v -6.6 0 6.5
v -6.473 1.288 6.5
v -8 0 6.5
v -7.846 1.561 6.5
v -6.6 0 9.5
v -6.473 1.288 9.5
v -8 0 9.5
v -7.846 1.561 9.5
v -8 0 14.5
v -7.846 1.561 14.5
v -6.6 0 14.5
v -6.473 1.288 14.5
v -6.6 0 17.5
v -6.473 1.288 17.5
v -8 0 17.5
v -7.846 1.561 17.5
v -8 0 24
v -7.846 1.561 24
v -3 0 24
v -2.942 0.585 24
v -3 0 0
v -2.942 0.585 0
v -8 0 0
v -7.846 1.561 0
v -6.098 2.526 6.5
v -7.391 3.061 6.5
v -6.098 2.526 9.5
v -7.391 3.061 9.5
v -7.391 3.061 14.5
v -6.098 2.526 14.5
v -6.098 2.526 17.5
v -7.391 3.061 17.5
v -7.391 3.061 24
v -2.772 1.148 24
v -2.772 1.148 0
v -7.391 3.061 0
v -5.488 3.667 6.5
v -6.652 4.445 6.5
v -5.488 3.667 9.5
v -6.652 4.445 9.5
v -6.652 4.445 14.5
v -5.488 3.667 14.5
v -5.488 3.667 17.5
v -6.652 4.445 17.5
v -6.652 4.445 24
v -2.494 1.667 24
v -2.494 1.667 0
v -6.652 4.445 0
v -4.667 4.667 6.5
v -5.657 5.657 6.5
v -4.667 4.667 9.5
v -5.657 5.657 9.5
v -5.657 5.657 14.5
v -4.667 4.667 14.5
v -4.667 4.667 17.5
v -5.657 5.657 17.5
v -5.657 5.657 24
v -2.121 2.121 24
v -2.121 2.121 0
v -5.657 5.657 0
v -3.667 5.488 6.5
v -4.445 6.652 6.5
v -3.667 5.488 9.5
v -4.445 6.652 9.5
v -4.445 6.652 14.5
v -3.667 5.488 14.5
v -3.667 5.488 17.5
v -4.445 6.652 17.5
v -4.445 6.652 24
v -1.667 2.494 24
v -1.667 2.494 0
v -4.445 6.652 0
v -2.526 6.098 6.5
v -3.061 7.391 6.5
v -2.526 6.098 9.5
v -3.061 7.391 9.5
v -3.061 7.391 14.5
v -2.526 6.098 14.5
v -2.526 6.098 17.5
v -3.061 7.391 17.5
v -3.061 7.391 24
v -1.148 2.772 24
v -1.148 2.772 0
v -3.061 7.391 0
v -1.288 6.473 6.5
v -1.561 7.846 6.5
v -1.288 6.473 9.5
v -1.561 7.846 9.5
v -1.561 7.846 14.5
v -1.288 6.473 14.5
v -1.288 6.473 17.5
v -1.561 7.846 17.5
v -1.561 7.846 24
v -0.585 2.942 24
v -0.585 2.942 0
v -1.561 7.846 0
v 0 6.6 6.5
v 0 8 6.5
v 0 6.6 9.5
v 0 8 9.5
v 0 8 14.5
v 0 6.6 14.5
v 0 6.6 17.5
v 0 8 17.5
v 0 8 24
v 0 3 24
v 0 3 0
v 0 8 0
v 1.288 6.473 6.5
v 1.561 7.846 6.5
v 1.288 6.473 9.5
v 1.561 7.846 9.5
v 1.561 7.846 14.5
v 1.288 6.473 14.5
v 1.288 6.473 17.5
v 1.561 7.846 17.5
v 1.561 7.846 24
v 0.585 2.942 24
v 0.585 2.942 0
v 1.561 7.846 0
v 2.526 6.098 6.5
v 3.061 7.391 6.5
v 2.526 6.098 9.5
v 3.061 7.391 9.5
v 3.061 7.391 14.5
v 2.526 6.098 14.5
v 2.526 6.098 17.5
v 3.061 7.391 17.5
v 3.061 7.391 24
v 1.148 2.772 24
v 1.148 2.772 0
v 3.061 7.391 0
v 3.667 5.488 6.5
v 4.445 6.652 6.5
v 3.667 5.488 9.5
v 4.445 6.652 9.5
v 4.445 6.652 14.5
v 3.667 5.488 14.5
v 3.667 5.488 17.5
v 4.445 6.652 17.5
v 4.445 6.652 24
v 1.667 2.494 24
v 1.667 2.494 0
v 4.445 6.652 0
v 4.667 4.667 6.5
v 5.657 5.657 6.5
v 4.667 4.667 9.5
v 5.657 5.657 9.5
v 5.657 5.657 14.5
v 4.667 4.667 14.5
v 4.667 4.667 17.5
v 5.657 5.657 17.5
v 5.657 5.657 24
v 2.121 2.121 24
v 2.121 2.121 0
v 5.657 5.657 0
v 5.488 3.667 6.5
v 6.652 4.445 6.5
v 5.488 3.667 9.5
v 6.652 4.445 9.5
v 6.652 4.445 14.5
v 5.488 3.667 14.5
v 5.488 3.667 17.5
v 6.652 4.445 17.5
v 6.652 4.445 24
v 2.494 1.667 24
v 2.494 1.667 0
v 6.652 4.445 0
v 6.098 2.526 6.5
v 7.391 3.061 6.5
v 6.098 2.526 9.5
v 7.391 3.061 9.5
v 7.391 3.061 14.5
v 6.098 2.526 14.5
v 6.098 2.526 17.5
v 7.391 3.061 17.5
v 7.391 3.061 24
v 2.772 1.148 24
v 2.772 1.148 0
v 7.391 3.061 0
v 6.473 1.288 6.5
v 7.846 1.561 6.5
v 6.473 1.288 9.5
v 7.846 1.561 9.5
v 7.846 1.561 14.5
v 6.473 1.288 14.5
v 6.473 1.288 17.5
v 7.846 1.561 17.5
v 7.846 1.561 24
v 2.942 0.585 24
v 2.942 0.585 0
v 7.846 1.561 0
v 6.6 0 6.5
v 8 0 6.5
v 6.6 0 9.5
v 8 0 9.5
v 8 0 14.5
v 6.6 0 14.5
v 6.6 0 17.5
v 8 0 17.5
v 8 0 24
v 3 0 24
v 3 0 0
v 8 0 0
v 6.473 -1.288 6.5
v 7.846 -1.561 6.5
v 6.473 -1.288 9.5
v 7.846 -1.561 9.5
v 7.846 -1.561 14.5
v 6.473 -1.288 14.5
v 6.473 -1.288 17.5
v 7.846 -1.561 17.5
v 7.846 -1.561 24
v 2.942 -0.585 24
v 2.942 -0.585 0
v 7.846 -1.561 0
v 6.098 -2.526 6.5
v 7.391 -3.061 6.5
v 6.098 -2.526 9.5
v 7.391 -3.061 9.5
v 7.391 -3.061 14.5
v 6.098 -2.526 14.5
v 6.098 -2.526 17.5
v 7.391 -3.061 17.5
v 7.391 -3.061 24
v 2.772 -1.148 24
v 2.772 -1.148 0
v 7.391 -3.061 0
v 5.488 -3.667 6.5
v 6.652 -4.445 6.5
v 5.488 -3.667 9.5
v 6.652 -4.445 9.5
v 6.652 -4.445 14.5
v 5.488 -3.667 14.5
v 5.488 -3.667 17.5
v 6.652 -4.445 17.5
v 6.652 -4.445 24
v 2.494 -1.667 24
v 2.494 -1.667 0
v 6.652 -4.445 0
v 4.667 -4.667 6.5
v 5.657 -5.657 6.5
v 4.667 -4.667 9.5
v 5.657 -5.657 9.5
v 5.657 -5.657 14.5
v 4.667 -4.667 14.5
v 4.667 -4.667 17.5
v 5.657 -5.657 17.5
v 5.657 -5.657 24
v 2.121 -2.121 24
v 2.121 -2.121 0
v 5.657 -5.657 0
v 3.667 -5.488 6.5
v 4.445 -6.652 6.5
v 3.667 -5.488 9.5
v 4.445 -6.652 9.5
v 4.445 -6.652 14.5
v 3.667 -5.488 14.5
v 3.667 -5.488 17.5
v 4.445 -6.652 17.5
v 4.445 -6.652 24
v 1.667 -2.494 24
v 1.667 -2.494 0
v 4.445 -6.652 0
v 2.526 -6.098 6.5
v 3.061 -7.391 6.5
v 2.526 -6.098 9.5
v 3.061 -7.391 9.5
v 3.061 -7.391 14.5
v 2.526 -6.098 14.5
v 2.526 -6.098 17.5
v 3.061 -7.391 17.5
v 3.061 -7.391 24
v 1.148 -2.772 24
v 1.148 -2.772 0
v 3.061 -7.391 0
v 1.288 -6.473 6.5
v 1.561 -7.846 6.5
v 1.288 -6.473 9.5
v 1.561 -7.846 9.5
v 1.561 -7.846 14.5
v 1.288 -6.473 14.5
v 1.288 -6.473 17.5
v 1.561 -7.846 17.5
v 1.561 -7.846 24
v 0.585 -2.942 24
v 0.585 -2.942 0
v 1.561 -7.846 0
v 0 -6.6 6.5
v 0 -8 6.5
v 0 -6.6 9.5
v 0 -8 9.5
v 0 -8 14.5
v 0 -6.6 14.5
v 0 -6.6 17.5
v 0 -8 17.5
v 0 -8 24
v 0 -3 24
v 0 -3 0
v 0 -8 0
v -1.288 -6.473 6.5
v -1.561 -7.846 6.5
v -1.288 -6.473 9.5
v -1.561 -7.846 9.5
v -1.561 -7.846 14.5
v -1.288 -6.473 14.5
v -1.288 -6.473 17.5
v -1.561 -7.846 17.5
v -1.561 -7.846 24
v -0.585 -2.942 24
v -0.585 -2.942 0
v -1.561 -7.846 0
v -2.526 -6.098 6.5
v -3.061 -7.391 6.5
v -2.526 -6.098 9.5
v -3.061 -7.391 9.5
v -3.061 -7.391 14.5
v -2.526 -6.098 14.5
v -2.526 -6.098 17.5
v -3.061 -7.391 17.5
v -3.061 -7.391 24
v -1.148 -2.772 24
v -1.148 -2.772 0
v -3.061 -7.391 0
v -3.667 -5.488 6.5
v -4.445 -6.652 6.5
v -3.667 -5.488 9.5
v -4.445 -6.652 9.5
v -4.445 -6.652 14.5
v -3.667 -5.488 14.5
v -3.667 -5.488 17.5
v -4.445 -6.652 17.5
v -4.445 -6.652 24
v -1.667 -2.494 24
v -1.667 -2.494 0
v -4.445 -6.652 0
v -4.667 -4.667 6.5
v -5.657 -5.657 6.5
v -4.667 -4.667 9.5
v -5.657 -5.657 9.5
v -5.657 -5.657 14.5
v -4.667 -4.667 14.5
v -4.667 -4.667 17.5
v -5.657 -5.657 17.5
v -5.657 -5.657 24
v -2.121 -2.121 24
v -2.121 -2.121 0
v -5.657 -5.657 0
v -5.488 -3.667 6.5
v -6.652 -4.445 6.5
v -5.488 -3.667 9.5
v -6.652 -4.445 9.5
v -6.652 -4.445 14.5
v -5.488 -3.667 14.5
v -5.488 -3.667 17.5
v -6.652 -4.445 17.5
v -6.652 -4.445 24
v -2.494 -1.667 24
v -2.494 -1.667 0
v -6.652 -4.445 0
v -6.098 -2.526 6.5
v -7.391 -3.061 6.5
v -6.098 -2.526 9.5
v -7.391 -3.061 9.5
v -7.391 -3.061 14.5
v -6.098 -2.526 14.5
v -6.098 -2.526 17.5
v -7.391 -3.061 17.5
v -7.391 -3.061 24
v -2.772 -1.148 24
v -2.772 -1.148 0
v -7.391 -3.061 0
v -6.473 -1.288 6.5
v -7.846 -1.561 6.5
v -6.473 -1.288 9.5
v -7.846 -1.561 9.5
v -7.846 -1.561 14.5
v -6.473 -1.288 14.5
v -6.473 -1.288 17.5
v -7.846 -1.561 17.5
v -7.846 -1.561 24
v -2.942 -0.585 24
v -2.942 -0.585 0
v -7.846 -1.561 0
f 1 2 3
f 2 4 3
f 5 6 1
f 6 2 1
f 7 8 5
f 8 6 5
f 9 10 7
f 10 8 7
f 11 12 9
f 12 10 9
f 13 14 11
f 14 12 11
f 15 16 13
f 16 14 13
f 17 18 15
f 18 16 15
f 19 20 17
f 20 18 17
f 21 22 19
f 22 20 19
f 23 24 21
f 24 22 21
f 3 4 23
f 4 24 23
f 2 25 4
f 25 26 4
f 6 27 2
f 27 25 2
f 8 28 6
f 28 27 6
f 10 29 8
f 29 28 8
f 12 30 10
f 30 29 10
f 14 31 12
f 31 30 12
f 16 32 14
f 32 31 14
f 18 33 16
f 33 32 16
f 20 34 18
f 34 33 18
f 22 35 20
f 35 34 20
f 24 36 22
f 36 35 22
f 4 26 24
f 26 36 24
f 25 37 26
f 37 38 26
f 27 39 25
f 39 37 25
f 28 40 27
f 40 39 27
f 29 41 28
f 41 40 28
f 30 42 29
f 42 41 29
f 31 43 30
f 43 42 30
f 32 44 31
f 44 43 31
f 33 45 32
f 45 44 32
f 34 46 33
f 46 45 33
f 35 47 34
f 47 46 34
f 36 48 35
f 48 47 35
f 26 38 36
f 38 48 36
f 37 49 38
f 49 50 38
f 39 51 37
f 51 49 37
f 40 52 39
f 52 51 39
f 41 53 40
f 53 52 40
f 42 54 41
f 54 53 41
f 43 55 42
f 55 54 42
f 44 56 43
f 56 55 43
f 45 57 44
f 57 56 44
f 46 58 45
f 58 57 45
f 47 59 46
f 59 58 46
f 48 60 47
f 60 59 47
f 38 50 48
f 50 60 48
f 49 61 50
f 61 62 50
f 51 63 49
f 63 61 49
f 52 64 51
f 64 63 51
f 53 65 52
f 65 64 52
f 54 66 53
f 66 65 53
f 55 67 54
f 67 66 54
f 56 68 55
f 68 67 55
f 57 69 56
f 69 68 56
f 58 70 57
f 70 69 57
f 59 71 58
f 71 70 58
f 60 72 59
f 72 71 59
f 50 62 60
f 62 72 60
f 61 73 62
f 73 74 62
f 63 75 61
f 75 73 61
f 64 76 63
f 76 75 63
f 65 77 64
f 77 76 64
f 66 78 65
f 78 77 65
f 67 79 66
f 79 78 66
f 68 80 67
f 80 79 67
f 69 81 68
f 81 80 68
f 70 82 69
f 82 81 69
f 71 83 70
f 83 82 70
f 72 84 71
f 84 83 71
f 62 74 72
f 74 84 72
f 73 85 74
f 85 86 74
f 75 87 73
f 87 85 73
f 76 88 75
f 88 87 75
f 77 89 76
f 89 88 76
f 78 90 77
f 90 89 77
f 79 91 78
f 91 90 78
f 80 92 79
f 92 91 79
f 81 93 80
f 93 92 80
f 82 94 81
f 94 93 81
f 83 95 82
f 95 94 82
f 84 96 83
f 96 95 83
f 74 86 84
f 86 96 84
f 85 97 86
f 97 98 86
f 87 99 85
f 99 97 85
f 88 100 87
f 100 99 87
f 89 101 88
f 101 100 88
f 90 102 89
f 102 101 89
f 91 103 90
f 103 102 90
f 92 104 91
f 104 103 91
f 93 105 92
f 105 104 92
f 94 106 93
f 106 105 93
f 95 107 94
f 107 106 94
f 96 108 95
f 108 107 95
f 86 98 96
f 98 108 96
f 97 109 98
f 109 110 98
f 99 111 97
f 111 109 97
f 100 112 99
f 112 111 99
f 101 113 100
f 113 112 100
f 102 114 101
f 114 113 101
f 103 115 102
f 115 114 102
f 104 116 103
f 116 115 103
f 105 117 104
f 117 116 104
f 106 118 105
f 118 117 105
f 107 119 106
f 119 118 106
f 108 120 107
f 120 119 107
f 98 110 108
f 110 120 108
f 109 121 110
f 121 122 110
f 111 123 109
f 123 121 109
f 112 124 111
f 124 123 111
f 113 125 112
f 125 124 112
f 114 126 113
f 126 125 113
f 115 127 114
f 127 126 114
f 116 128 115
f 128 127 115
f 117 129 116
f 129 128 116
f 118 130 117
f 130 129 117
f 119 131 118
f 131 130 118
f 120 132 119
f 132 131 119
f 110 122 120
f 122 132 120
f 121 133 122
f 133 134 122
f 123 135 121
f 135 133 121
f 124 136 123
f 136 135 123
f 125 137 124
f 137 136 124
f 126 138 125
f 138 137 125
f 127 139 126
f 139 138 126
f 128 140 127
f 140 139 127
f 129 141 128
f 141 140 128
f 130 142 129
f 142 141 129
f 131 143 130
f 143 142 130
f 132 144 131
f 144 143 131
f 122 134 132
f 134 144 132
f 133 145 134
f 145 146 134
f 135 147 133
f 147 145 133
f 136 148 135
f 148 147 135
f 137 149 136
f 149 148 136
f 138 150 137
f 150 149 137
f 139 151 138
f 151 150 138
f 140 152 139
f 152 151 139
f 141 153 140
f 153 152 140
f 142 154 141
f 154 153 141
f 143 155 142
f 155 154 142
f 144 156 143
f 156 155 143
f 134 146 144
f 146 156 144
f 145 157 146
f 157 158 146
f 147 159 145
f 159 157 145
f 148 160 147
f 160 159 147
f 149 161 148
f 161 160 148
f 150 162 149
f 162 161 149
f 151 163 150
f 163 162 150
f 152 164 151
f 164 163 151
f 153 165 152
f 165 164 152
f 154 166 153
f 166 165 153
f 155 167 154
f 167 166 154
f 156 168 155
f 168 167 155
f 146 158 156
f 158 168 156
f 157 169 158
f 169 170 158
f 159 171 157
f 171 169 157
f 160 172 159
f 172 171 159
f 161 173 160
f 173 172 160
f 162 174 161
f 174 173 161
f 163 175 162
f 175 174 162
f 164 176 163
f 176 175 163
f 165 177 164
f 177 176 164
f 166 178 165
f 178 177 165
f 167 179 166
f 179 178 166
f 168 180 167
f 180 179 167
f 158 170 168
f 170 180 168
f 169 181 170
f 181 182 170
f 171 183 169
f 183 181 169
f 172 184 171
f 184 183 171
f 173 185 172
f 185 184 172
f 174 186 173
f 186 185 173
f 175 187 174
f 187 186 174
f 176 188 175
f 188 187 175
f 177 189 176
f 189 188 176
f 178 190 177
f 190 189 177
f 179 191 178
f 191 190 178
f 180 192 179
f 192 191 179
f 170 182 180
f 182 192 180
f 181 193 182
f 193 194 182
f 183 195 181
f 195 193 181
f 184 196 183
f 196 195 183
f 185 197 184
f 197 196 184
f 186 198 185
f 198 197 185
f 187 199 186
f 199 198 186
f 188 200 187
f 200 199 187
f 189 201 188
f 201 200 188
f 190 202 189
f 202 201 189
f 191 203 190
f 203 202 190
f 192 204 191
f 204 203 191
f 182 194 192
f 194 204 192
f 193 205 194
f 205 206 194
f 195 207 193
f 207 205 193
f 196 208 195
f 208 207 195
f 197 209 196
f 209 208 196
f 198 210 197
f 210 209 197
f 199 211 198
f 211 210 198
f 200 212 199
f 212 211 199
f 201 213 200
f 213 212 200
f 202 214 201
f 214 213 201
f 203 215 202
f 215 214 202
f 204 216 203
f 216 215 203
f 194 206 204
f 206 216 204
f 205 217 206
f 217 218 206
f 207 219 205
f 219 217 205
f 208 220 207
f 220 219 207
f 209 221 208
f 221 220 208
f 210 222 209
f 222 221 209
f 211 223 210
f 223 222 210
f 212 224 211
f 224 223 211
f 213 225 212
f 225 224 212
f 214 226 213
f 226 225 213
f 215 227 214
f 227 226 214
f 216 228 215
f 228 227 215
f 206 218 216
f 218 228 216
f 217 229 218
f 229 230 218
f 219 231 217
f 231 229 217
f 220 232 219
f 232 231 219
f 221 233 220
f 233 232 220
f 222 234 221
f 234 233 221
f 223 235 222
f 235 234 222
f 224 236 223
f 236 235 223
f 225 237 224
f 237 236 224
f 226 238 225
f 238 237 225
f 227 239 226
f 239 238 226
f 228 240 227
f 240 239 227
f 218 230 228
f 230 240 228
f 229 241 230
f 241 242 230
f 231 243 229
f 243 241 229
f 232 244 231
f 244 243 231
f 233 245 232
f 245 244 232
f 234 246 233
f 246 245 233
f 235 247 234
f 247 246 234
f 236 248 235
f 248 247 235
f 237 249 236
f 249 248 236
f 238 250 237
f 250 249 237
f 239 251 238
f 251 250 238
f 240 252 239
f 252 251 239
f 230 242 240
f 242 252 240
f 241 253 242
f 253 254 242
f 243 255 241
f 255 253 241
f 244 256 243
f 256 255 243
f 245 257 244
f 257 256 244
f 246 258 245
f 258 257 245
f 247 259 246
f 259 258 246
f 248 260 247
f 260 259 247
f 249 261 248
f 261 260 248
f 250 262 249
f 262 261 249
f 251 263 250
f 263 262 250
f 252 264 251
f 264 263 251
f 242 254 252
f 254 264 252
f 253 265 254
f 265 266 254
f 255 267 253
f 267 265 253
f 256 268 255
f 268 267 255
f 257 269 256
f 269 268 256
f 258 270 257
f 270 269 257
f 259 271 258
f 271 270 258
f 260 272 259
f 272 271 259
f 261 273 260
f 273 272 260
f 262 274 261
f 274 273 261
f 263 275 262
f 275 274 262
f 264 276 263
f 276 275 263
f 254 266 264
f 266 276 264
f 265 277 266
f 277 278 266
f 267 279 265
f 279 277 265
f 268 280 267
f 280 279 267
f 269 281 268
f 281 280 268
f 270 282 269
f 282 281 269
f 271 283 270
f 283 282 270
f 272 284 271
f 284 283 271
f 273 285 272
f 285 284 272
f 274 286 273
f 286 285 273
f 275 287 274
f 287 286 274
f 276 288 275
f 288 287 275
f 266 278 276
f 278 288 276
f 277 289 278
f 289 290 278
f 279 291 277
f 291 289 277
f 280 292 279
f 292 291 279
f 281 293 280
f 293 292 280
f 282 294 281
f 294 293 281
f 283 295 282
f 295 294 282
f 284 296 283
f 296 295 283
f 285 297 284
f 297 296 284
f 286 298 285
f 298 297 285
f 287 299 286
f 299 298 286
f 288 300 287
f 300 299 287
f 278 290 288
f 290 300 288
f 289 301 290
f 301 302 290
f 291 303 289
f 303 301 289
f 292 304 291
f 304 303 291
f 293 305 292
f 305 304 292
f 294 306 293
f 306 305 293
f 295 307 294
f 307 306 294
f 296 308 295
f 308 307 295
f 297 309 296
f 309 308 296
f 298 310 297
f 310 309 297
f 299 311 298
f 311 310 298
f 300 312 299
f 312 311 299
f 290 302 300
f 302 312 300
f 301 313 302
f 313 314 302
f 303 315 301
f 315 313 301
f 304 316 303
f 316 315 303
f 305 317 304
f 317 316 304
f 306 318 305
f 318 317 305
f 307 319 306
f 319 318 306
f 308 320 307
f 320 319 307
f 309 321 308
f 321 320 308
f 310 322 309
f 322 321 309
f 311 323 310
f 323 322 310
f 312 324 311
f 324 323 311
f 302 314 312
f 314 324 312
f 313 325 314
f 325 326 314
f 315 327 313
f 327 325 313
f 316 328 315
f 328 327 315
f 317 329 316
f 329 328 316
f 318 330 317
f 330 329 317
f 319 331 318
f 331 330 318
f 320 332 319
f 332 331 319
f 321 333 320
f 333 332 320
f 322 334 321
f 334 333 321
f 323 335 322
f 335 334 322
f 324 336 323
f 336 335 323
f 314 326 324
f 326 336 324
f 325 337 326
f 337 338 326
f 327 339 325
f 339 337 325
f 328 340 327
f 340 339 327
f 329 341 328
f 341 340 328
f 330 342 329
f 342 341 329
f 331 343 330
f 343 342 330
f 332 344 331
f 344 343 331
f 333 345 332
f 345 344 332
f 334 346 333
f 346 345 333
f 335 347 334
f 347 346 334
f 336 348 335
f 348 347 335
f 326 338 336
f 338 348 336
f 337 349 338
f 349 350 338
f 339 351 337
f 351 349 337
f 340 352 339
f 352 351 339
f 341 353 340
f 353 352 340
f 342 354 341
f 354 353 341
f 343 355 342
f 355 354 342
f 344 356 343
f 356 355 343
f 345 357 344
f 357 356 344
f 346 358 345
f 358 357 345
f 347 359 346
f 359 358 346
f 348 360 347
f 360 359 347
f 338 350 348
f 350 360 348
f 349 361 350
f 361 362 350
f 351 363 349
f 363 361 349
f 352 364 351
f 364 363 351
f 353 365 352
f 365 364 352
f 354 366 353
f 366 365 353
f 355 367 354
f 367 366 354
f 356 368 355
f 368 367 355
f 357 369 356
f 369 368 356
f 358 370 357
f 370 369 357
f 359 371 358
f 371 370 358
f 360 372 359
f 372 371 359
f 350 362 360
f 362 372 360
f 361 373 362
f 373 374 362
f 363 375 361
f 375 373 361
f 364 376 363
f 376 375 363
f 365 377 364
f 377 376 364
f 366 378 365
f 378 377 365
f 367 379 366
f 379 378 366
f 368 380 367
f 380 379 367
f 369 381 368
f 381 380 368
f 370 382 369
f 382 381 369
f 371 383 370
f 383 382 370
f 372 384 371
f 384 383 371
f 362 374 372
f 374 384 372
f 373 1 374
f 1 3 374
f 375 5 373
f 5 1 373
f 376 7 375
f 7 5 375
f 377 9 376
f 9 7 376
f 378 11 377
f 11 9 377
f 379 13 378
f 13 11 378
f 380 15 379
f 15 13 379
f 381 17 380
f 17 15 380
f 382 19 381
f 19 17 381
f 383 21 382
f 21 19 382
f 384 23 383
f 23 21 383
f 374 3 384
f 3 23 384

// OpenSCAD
$fn = 32;

// ----------------------------------------------------------------------
// Grooved revolve: stepped, bore R3
// ----------------------------------------------------------------------

// --- parameters (mm) ---
bore_r = 3;               // bore radius
outer_r = 8;              // outer radius of the body
total_h = 24;             // overall height, Z
wall = 5;                 // radial wall thickness
groove_w = 3;             // groove width
groove_d = 1.4;           // groove depth
grooves = 2;              // number of outer grooves

bbox_x = 2 * outer_r;  // full diameter
bore_d = 2 * bore_r;  // bore diameter
body_d = 2 * outer_r;  // body diameter
revolve_angle = 360;  // full turn around the Z axis

profile = [[3, 0], [8, 0], [8, 6.5], [6.6, 6.5], [6.6, 9.5], [8, 9.5], [8, 14.5], [6.6, 14.5], [6.6, 17.5], [8, 17.5], [8, 24], [3, 24]];  // primary outline, 12 points, counter clockwise

// --- the one profile operation ---
rotate_extrude(angle = revolve_angle) polygon(points = profile);
